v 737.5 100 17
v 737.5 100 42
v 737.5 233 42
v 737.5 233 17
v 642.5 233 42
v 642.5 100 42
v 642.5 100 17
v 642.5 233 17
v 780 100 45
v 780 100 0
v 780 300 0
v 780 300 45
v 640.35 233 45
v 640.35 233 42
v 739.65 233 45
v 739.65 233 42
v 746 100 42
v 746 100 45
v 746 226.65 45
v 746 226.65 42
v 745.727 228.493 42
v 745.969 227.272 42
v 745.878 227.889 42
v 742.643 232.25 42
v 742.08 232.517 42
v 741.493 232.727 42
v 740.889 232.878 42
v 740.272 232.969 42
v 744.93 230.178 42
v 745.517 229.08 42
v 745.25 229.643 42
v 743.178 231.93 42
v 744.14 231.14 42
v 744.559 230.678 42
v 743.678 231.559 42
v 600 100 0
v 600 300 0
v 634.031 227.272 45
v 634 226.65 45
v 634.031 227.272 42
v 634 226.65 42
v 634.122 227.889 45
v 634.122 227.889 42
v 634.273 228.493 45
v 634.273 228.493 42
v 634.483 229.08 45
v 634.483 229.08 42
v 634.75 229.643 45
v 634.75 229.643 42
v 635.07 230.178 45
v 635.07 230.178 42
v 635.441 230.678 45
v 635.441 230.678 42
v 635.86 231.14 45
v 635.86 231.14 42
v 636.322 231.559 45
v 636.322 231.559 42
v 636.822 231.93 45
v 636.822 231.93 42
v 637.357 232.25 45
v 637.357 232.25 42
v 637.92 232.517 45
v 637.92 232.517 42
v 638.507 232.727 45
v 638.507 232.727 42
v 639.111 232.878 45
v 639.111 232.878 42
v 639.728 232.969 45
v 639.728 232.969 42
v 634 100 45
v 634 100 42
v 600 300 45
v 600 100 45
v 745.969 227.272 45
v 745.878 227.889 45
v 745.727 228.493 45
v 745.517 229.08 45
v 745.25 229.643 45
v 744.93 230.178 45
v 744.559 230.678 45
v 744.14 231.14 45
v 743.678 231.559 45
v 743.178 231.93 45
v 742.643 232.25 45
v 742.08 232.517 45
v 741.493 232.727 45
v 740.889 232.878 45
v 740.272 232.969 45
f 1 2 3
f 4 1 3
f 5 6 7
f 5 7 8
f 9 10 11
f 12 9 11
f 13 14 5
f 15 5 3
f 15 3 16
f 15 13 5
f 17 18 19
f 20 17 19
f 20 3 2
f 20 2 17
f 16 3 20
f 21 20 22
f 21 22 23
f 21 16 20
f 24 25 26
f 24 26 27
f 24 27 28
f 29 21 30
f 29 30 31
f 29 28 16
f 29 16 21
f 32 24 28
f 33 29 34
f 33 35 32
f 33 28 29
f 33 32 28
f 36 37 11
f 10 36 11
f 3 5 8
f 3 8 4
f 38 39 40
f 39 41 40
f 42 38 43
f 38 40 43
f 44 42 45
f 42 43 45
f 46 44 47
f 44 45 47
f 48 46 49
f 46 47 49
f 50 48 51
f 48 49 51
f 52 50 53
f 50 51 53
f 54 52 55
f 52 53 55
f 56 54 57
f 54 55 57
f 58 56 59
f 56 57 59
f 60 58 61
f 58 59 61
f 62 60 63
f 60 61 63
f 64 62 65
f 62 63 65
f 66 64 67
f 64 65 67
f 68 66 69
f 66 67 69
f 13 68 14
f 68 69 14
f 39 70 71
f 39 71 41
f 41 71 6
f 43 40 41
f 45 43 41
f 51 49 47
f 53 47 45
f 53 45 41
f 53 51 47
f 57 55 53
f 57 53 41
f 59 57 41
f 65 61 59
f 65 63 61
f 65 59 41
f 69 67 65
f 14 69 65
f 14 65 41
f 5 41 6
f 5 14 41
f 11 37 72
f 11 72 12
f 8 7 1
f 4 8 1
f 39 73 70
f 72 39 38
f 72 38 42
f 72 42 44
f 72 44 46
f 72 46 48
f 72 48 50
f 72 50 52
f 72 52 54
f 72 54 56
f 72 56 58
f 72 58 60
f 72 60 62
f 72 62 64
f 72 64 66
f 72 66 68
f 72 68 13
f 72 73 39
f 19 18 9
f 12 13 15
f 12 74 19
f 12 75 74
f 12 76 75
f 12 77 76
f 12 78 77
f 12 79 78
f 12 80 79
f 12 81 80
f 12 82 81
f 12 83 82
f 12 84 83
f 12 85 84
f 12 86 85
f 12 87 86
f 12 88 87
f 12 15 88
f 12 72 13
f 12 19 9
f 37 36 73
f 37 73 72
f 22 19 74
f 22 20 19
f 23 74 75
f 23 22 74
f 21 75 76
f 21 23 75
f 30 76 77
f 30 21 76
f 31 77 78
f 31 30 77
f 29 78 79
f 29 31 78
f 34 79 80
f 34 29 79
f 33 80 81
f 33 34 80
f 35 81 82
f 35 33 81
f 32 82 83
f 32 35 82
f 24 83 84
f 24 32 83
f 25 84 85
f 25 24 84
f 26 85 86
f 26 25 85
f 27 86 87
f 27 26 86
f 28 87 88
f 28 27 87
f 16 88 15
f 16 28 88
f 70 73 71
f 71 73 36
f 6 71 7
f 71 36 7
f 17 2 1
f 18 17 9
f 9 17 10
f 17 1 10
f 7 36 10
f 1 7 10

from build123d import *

# Parameters (mm, degrees)
SKETCH151_W     = 180
SKETCH151_H     = 200
PAD010_DEPTH    = 45
SKETCH152_W     = 112
SKETCH152_H     = 133
POCKET030_DEPTH = 3
SKETCH153_W     = 95
SKETCH153_H     = 134
POCKET031_DEPTH = 25
FILLET009_R     = 6.35


with BuildPart() as part:
    # Sketch151 → Pad010 (new body)
    with BuildSketch(Plane.XY):
        with Locations((690, 200)):
            Rectangle(SKETCH151_W, SKETCH151_H)
    extrude(amount=PAD010_DEPTH)

    # Sketch152 (on Face6 of Pad010) → Pocket030 (cut)
    with BuildSketch(Plane.XY.offset(45)):
        with Locations((690, 166.5)):
            Rectangle(SKETCH152_W, SKETCH152_H)
    extrude(amount=-POCKET030_DEPTH, mode=Mode.SUBTRACT)

    # Sketch153 (on Face6 of Pocket030) → Pocket031 (cut)
    with BuildSketch(Plane.XY.offset(42)):
        with Locations((690.00001, 166.000003)):
            Rectangle(SKETCH153_W, SKETCH153_H)
    extrude(amount=-POCKET031_DEPTH, mode=Mode.SUBTRACT)

    # Fillet009
    fillet009_edges = [part.edges().sort_by_distance(p)[0] for p in [
        (634, 233, 43.5),
        (746, 233, 43.5),
    ]]
    fillet(fillet009_edges, radius=FILLET009_R)


solid = part.part
